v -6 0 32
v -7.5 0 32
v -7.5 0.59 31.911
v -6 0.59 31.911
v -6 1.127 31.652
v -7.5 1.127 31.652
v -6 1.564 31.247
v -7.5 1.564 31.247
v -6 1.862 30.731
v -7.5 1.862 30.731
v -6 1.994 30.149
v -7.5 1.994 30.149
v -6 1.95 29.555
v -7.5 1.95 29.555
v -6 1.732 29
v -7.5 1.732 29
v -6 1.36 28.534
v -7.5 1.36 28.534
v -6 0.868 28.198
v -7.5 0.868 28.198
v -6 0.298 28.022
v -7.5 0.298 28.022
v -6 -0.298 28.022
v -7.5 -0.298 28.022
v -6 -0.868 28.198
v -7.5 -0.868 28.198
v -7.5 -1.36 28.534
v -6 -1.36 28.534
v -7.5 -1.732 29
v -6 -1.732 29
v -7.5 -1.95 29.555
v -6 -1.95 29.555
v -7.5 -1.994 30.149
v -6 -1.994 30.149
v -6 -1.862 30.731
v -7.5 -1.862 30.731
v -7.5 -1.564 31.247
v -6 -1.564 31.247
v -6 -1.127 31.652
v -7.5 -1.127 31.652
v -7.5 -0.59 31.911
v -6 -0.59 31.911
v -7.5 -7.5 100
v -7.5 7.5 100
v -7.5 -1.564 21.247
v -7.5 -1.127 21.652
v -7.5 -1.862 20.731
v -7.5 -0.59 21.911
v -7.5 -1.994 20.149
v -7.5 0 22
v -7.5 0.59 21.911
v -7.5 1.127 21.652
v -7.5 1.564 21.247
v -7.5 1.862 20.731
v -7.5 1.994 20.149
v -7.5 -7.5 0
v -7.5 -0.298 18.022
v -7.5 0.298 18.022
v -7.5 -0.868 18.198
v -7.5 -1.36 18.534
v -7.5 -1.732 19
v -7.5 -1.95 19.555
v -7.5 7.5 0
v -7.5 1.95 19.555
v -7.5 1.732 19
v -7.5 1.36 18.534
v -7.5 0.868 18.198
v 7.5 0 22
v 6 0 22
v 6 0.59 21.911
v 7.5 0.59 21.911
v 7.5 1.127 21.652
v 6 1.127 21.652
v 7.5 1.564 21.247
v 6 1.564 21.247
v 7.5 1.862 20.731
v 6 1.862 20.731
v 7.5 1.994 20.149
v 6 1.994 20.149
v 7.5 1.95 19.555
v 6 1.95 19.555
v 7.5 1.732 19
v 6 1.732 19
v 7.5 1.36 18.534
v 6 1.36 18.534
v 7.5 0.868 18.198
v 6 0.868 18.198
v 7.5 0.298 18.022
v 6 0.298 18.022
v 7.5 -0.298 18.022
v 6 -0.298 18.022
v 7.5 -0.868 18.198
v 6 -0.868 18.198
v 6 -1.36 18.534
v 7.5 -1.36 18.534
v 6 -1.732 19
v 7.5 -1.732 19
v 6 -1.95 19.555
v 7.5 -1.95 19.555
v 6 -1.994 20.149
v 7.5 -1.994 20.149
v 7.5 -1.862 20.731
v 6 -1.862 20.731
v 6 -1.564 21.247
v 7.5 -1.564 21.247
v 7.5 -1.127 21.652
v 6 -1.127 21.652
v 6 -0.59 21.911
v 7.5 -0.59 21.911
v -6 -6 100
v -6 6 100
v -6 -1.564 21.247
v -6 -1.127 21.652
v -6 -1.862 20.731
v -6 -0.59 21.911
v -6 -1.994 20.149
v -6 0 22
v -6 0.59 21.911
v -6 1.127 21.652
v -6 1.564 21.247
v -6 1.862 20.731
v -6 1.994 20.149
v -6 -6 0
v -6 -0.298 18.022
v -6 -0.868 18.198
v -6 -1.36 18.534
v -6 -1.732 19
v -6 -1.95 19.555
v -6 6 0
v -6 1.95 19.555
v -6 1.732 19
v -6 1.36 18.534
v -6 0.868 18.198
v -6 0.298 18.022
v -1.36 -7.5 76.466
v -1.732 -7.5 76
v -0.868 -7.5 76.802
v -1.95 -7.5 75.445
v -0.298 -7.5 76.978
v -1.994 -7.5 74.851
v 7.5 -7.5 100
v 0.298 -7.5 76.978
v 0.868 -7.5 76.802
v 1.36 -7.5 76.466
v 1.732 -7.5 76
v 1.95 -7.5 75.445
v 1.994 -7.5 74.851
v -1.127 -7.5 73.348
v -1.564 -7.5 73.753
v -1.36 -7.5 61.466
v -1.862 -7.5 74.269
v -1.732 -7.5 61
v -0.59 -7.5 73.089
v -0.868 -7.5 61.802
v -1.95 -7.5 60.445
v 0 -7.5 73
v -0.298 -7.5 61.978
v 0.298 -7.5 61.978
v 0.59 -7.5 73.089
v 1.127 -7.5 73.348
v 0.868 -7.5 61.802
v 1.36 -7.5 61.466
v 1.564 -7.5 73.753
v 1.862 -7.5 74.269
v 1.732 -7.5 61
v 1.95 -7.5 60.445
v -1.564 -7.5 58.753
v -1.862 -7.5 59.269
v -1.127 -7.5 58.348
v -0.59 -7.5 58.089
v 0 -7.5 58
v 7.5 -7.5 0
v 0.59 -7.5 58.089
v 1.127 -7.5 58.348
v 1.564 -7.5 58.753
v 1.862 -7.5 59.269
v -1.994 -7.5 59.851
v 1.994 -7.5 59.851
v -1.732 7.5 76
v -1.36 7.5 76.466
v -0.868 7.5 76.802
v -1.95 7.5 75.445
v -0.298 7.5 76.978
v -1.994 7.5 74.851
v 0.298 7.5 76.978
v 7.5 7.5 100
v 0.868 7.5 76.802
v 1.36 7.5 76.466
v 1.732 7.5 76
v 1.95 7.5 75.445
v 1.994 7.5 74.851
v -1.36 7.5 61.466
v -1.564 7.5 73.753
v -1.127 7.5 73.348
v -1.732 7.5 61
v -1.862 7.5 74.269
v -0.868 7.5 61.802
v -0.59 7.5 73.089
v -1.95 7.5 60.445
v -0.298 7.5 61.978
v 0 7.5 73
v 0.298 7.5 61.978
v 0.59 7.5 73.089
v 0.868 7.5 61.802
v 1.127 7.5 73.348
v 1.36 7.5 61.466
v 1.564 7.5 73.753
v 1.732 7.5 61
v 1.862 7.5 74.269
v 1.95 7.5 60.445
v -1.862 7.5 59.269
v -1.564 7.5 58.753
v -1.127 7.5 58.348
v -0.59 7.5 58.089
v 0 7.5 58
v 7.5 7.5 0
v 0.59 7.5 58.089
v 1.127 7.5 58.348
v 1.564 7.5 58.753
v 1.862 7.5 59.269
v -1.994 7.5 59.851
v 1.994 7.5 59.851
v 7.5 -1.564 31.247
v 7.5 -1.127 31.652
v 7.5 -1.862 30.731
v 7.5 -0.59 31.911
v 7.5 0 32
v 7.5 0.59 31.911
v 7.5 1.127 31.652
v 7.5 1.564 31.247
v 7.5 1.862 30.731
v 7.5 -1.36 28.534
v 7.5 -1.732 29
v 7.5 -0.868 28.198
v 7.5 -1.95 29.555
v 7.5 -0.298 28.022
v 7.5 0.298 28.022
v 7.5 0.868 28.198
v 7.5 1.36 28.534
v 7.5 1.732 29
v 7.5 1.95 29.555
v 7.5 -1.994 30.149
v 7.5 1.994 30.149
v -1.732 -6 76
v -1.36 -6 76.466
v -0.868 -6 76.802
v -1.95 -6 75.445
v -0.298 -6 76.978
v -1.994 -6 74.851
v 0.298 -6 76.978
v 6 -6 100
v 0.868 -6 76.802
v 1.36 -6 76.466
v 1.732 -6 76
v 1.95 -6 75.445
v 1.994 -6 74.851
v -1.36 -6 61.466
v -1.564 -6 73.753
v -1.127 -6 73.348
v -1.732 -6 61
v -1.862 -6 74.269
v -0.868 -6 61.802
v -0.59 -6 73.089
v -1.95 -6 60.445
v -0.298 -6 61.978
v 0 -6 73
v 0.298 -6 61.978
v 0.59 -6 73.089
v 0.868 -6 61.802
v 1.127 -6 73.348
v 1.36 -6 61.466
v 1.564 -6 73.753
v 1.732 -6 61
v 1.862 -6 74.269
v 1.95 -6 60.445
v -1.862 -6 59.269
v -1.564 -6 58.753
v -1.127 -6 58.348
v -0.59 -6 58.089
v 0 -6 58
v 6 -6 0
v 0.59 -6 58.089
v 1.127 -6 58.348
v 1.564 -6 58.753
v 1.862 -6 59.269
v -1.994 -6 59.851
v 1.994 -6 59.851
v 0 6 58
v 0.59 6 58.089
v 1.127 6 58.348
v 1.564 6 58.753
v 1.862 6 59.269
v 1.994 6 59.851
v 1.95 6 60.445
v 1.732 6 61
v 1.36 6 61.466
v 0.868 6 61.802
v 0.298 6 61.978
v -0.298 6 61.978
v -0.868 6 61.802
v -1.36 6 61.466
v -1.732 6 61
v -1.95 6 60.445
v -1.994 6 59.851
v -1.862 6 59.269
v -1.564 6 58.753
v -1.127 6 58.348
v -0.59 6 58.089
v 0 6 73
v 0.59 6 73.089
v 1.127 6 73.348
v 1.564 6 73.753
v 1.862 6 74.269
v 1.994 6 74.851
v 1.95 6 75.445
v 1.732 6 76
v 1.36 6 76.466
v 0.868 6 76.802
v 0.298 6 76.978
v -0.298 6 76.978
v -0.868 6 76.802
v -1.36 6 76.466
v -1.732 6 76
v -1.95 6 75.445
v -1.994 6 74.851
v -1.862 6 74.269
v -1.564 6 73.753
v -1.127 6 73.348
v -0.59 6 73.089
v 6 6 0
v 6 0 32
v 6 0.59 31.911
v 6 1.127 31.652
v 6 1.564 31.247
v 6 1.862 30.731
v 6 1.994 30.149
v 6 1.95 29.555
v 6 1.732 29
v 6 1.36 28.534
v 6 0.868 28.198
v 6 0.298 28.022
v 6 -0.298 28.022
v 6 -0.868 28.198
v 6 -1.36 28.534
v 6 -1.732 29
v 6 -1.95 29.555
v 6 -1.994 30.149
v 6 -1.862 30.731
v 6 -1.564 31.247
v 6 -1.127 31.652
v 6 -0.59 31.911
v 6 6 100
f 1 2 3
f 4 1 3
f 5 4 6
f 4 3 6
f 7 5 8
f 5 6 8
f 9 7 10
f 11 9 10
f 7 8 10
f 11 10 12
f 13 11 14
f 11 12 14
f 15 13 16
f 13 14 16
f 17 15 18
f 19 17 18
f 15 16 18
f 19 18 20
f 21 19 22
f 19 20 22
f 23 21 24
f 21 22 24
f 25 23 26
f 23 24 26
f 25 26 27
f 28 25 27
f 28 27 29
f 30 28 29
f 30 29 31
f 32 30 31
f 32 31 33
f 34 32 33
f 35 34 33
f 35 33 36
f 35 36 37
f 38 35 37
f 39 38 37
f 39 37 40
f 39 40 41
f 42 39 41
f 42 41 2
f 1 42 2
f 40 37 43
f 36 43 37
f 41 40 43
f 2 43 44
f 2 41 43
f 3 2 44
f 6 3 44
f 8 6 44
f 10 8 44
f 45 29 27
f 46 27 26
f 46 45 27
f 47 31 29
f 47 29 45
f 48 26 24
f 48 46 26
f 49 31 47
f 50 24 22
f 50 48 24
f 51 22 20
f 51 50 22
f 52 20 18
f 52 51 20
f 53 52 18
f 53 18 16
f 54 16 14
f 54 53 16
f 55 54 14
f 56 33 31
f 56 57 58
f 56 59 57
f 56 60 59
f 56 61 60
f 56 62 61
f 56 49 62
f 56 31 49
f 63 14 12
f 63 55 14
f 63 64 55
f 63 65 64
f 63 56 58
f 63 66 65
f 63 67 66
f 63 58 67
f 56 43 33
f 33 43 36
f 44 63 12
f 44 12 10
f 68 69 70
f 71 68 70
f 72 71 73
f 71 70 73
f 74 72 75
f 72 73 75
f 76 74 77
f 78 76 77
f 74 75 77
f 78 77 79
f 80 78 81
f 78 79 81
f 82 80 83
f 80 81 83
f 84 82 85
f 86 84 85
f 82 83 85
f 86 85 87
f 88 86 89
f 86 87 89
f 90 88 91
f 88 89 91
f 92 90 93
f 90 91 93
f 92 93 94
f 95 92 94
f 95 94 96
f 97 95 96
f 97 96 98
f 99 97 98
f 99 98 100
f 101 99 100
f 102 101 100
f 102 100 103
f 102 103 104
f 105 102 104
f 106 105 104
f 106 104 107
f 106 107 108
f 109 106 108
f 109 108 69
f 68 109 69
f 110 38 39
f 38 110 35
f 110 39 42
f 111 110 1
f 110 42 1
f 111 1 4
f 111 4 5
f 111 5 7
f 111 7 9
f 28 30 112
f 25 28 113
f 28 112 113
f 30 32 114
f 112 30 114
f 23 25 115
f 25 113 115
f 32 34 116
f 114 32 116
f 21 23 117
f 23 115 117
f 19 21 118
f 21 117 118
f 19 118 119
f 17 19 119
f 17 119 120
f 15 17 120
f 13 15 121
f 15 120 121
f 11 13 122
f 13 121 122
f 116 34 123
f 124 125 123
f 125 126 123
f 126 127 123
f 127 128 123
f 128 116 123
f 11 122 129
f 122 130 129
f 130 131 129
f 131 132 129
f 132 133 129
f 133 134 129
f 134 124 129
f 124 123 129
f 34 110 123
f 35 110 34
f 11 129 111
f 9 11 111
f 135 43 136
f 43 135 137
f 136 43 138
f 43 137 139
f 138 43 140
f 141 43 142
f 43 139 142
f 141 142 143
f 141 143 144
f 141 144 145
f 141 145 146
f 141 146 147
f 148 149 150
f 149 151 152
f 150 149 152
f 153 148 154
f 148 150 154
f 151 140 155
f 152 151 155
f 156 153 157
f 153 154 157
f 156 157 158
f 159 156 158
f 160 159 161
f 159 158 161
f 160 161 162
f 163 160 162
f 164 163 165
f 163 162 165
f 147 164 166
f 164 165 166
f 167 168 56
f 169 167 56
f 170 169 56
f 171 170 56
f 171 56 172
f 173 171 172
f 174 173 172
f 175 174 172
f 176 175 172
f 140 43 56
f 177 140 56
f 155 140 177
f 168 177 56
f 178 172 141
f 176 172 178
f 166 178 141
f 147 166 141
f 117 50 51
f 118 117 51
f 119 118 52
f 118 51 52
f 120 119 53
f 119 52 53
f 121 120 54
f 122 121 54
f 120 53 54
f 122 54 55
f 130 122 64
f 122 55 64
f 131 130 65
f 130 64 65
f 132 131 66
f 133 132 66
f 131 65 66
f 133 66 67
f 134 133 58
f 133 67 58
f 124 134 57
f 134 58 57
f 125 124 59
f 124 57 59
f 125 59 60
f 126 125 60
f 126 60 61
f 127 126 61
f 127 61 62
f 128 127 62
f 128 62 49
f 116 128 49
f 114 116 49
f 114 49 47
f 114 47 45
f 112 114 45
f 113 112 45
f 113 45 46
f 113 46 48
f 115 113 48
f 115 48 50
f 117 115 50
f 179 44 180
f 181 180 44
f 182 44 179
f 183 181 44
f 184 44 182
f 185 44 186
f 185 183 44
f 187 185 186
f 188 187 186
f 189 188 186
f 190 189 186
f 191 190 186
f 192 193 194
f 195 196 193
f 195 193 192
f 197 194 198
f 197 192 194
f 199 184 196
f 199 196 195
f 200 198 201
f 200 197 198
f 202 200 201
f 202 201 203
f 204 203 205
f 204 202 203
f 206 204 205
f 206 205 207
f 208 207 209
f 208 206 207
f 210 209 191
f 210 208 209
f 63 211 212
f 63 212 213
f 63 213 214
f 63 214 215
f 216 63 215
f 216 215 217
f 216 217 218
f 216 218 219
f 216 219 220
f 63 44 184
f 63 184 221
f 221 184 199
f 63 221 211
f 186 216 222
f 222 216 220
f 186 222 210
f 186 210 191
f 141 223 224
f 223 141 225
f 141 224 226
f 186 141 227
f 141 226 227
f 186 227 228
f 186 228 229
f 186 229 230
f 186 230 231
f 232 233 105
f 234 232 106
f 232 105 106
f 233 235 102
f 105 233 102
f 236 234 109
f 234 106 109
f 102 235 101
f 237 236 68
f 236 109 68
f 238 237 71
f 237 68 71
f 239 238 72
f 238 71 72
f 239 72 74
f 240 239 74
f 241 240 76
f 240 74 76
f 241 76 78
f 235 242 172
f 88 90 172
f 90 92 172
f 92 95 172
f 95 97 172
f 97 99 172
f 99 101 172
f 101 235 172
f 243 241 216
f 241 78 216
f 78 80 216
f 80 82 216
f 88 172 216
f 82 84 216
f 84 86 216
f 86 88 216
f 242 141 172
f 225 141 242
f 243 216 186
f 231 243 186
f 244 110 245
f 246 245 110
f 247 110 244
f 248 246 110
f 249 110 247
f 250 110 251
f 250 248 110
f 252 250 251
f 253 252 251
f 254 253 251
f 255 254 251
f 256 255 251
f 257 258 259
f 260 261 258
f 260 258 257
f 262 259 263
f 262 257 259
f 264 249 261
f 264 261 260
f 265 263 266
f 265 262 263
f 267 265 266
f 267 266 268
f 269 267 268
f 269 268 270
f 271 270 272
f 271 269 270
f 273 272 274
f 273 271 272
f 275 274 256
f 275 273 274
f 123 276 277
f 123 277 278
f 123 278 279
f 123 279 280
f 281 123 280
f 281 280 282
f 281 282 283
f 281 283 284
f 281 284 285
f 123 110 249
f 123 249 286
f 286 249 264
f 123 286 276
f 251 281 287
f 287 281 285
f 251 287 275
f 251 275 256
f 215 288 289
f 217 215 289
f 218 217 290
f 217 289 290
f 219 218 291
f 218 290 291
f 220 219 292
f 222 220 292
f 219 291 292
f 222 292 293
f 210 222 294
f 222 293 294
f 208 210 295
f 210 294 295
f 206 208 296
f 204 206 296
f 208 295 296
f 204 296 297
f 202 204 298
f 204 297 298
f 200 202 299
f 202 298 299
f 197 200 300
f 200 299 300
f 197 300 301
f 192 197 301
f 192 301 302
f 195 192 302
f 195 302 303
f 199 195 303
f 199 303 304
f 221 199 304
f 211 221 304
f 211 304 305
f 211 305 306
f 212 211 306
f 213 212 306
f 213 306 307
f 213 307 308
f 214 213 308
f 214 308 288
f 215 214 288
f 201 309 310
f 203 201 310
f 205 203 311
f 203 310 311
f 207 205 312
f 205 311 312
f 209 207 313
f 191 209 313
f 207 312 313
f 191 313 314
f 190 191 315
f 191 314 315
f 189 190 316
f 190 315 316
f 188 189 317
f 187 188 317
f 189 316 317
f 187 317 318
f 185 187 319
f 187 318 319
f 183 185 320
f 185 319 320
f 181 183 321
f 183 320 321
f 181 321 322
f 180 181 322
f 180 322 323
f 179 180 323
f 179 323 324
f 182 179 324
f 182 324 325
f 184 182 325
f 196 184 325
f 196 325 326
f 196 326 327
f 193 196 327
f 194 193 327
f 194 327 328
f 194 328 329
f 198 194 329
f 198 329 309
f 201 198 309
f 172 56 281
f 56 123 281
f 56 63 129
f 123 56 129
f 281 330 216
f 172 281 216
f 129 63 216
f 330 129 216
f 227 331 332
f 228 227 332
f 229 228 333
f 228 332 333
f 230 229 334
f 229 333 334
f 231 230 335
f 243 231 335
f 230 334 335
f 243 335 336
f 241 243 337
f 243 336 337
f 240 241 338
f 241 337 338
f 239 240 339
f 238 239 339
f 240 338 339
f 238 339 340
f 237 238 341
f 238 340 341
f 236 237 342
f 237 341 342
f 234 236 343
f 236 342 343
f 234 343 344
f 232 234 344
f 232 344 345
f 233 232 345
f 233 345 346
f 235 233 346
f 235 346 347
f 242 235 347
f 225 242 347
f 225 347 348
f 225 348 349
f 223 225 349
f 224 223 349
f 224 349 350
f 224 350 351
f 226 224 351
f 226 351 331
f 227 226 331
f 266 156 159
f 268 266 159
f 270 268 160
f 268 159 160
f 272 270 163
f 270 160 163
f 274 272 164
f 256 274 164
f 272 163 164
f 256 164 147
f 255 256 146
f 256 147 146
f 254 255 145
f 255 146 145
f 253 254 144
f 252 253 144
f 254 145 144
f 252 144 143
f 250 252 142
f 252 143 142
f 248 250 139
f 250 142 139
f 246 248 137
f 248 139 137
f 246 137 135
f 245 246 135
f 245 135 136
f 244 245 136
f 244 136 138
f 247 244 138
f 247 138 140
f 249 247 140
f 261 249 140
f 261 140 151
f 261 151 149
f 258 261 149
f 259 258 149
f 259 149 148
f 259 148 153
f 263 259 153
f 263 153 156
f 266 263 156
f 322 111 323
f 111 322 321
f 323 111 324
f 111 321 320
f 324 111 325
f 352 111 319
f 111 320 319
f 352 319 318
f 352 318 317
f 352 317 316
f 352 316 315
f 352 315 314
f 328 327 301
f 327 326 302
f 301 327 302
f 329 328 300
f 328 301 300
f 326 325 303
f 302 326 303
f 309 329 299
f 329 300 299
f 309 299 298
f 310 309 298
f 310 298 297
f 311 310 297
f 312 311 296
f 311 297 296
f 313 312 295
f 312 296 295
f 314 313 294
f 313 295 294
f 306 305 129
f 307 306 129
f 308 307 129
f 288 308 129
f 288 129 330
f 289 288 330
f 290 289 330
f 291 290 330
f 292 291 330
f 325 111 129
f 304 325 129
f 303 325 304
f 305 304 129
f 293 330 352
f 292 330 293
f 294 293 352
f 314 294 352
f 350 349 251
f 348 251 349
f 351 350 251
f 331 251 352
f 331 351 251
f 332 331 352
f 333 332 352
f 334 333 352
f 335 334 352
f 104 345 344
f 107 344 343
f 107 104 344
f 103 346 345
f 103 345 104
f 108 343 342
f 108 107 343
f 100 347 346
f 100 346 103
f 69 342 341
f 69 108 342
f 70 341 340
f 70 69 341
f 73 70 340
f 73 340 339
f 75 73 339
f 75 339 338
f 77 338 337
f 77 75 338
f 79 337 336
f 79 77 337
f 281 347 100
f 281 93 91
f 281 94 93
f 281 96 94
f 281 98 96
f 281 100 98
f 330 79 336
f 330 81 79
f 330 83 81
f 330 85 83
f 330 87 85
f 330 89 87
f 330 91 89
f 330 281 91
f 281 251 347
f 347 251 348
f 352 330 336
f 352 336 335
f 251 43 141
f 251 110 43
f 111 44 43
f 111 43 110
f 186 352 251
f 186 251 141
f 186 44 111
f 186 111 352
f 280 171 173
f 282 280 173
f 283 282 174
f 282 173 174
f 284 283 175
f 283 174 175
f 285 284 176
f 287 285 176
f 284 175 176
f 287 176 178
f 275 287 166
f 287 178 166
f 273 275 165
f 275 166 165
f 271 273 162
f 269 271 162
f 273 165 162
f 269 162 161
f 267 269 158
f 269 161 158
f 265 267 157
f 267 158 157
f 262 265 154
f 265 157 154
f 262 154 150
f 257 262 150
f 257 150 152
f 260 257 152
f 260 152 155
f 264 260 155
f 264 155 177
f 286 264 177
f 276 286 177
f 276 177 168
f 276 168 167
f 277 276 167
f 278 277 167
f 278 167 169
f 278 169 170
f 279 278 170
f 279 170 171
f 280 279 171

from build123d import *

# Parameters (mm, degrees)
SKETCH_1_W          = 15
SKETCH_1_H          = 15
SKETCH_1_W_2        = 12
SKETCH_1_H_2        = 12
EXTRUDE_1_DEPTH     = 100
SKETCH_4_R          = 2
CUT_EXTRUDE_2_DEPTH = 75
SKETCH_5_R          = 2
CUT_EXTRUDE_3_DEPTH = 102.396498953


with BuildPart() as part:
    # 草图1 → 凸台-拉伸1 (new body)
    with BuildSketch(Plane.XY):
        Rectangle(SKETCH_1_W, SKETCH_1_H)
        Rectangle(SKETCH_1_W_2, SKETCH_1_H_2, mode=Mode.SUBTRACT)
    extrude(amount=EXTRUDE_1_DEPTH)

    # 草图4 → 切除-拉伸2 (cut)
    with BuildSketch(Plane.XZ.offset(7.5)):
        with Locations(Location((0, 75, 0), (0, 0, 270))):
            Circle(SKETCH_4_R)
        with Locations(Location((0, 60, 0), (0, 0, 270))):
            Circle(SKETCH_4_R)
    extrude(amount=-CUT_EXTRUDE_2_DEPTH, mode=Mode.SUBTRACT)

    # 草图5 → 切除-拉伸3 (cut, through all)
    with BuildSketch(Plane.ZY.offset(7.5)):
        with Locations((20, 0)):
            Circle(SKETCH_5_R)
        with Locations((30, 0)):
            Circle(SKETCH_5_R)
    extrude(amount=-CUT_EXTRUDE_3_DEPTH, mode=Mode.SUBTRACT)


solid = part.part
